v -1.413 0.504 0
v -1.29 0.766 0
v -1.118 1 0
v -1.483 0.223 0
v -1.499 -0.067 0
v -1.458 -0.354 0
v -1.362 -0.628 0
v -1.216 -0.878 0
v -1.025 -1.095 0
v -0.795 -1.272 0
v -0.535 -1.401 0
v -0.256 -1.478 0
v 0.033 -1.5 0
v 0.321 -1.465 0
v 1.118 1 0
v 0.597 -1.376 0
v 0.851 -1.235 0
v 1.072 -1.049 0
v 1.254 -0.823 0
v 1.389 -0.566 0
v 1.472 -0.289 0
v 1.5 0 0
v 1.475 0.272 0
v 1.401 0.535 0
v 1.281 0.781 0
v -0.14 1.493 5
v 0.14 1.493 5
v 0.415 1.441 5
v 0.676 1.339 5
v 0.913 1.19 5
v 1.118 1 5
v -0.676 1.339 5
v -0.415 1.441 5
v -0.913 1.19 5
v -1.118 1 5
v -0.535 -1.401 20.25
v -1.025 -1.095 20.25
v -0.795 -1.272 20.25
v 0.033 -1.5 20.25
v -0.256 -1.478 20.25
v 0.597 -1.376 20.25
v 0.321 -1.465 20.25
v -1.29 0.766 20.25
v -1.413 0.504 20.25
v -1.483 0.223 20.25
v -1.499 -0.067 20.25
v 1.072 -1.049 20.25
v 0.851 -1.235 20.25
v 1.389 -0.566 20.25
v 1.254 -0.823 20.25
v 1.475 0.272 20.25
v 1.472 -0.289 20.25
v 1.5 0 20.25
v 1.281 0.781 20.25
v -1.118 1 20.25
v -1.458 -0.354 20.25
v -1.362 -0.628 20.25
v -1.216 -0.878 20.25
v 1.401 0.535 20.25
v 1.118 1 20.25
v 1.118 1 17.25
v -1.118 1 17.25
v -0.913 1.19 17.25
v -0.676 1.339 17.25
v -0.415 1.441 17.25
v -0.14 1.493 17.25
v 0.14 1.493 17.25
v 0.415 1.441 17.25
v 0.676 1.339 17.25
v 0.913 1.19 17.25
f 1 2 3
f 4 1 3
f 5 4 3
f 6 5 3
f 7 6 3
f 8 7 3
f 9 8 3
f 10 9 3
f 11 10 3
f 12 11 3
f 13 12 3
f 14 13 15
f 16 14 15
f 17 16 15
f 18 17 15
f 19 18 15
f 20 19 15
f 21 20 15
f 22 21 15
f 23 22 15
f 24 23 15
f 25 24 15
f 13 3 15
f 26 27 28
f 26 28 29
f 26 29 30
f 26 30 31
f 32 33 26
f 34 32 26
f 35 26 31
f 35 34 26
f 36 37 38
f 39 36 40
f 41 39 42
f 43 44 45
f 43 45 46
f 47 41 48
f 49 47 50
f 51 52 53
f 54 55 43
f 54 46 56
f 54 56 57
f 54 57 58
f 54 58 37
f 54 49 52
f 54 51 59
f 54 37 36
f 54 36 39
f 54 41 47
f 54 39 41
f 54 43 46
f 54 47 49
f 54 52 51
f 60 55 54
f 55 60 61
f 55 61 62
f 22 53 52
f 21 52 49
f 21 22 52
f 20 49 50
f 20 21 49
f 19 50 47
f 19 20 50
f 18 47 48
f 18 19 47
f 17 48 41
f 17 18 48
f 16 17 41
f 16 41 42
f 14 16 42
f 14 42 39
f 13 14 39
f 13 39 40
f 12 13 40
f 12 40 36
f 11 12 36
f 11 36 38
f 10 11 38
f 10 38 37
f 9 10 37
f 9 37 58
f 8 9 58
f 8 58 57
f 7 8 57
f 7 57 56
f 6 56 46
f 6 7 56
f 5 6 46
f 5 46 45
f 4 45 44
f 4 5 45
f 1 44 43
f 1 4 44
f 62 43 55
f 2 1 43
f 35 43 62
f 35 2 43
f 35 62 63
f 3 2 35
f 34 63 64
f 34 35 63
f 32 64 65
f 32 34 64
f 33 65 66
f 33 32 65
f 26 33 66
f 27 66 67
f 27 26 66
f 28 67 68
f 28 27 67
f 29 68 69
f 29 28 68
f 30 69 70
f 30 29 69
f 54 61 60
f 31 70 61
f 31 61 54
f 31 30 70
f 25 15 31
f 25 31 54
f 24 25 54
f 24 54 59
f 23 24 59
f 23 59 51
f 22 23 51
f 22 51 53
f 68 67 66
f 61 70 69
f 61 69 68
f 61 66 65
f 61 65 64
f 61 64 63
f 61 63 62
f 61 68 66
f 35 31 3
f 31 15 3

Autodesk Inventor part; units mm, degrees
ref_plane "YZ Plane" through (0, 0, 0) normal (1, 0, 0) x (0, 1, 0)
ref_plane "XZ Plane" through (0, 0, 0) normal (0, 1, 0) x (-1, 0, 0)
ref_plane "XY Plane" through (0, 0, 0) normal (0, 0, 1) x (1, 0, 0)
sketch "Эскиз1" plane through (0, 0, 0) normal (0, 0, 1) x (1, 0, 0)
  circle A0 centre (0, 0) radius 1.5
  dimension "d0" = 3
extrude "Выдавливание1" add sketch "Эскиз1" along normal blind 20.25
sketch "Эскиз2" plane through (0, 0, 20.25) normal (0, 0, 1) x (1, 0, 0)
  line L0 (-1.5, -1) -> (1.5, -1)
  line L1 (1.5, -1) -> (1.5, 1)
  line L2 (1.5, 1) -> (-1.5, 1)
  line L3 (-1.5, 1) -> (-1.5, -1)
  line L4 (-1.5, -1) -> (1.5, 1) construction
  line L5 (1.5, -1) -> (-1.5, 1) construction
  circle A0 centre (0, 0) radius 1.5
  point P0 (-1.118, 1)
  point P1 (1.118, 1)
  dimension "d3" = 2
extrude "Выдавливание2" cut sketch "Эскиз2" against normal blind 3 contours A0 L2
sketch "Эскиз3" plane through (0, 0, 0) normal (0, 0, -1) x (-1, 0, 0)
  arc A0 (1.118, 1) -> (-1.118, 1) centre (0, 0) ccw projected
  line L0 (-1.118, 1) -> (1.118, 1) projected
extrude "Выдавливание3" cut sketch "Эскиз3" against normal blind 5
equation "\"Радиус_гибки\" = Толщина"
equation "\"Ширина_просечки\" = Толщина"
equation "\"Глубина_просечки\" = 0.5 * Толщина"
equation "\"Размер_просечки\" = 4 * Толщина"
equation "\"Мин_остаток\" = 2 * Толщина"
equation "\"Радиус_перехода\" = Радиус_гибки"
equation "\"Радиус_Якоби\" = Толщина"
equation "\"Размер_зазора\" = Толщина"
equation "\"Толщина\" = 0.5"
properties part number "Ось 3мм задняя"
